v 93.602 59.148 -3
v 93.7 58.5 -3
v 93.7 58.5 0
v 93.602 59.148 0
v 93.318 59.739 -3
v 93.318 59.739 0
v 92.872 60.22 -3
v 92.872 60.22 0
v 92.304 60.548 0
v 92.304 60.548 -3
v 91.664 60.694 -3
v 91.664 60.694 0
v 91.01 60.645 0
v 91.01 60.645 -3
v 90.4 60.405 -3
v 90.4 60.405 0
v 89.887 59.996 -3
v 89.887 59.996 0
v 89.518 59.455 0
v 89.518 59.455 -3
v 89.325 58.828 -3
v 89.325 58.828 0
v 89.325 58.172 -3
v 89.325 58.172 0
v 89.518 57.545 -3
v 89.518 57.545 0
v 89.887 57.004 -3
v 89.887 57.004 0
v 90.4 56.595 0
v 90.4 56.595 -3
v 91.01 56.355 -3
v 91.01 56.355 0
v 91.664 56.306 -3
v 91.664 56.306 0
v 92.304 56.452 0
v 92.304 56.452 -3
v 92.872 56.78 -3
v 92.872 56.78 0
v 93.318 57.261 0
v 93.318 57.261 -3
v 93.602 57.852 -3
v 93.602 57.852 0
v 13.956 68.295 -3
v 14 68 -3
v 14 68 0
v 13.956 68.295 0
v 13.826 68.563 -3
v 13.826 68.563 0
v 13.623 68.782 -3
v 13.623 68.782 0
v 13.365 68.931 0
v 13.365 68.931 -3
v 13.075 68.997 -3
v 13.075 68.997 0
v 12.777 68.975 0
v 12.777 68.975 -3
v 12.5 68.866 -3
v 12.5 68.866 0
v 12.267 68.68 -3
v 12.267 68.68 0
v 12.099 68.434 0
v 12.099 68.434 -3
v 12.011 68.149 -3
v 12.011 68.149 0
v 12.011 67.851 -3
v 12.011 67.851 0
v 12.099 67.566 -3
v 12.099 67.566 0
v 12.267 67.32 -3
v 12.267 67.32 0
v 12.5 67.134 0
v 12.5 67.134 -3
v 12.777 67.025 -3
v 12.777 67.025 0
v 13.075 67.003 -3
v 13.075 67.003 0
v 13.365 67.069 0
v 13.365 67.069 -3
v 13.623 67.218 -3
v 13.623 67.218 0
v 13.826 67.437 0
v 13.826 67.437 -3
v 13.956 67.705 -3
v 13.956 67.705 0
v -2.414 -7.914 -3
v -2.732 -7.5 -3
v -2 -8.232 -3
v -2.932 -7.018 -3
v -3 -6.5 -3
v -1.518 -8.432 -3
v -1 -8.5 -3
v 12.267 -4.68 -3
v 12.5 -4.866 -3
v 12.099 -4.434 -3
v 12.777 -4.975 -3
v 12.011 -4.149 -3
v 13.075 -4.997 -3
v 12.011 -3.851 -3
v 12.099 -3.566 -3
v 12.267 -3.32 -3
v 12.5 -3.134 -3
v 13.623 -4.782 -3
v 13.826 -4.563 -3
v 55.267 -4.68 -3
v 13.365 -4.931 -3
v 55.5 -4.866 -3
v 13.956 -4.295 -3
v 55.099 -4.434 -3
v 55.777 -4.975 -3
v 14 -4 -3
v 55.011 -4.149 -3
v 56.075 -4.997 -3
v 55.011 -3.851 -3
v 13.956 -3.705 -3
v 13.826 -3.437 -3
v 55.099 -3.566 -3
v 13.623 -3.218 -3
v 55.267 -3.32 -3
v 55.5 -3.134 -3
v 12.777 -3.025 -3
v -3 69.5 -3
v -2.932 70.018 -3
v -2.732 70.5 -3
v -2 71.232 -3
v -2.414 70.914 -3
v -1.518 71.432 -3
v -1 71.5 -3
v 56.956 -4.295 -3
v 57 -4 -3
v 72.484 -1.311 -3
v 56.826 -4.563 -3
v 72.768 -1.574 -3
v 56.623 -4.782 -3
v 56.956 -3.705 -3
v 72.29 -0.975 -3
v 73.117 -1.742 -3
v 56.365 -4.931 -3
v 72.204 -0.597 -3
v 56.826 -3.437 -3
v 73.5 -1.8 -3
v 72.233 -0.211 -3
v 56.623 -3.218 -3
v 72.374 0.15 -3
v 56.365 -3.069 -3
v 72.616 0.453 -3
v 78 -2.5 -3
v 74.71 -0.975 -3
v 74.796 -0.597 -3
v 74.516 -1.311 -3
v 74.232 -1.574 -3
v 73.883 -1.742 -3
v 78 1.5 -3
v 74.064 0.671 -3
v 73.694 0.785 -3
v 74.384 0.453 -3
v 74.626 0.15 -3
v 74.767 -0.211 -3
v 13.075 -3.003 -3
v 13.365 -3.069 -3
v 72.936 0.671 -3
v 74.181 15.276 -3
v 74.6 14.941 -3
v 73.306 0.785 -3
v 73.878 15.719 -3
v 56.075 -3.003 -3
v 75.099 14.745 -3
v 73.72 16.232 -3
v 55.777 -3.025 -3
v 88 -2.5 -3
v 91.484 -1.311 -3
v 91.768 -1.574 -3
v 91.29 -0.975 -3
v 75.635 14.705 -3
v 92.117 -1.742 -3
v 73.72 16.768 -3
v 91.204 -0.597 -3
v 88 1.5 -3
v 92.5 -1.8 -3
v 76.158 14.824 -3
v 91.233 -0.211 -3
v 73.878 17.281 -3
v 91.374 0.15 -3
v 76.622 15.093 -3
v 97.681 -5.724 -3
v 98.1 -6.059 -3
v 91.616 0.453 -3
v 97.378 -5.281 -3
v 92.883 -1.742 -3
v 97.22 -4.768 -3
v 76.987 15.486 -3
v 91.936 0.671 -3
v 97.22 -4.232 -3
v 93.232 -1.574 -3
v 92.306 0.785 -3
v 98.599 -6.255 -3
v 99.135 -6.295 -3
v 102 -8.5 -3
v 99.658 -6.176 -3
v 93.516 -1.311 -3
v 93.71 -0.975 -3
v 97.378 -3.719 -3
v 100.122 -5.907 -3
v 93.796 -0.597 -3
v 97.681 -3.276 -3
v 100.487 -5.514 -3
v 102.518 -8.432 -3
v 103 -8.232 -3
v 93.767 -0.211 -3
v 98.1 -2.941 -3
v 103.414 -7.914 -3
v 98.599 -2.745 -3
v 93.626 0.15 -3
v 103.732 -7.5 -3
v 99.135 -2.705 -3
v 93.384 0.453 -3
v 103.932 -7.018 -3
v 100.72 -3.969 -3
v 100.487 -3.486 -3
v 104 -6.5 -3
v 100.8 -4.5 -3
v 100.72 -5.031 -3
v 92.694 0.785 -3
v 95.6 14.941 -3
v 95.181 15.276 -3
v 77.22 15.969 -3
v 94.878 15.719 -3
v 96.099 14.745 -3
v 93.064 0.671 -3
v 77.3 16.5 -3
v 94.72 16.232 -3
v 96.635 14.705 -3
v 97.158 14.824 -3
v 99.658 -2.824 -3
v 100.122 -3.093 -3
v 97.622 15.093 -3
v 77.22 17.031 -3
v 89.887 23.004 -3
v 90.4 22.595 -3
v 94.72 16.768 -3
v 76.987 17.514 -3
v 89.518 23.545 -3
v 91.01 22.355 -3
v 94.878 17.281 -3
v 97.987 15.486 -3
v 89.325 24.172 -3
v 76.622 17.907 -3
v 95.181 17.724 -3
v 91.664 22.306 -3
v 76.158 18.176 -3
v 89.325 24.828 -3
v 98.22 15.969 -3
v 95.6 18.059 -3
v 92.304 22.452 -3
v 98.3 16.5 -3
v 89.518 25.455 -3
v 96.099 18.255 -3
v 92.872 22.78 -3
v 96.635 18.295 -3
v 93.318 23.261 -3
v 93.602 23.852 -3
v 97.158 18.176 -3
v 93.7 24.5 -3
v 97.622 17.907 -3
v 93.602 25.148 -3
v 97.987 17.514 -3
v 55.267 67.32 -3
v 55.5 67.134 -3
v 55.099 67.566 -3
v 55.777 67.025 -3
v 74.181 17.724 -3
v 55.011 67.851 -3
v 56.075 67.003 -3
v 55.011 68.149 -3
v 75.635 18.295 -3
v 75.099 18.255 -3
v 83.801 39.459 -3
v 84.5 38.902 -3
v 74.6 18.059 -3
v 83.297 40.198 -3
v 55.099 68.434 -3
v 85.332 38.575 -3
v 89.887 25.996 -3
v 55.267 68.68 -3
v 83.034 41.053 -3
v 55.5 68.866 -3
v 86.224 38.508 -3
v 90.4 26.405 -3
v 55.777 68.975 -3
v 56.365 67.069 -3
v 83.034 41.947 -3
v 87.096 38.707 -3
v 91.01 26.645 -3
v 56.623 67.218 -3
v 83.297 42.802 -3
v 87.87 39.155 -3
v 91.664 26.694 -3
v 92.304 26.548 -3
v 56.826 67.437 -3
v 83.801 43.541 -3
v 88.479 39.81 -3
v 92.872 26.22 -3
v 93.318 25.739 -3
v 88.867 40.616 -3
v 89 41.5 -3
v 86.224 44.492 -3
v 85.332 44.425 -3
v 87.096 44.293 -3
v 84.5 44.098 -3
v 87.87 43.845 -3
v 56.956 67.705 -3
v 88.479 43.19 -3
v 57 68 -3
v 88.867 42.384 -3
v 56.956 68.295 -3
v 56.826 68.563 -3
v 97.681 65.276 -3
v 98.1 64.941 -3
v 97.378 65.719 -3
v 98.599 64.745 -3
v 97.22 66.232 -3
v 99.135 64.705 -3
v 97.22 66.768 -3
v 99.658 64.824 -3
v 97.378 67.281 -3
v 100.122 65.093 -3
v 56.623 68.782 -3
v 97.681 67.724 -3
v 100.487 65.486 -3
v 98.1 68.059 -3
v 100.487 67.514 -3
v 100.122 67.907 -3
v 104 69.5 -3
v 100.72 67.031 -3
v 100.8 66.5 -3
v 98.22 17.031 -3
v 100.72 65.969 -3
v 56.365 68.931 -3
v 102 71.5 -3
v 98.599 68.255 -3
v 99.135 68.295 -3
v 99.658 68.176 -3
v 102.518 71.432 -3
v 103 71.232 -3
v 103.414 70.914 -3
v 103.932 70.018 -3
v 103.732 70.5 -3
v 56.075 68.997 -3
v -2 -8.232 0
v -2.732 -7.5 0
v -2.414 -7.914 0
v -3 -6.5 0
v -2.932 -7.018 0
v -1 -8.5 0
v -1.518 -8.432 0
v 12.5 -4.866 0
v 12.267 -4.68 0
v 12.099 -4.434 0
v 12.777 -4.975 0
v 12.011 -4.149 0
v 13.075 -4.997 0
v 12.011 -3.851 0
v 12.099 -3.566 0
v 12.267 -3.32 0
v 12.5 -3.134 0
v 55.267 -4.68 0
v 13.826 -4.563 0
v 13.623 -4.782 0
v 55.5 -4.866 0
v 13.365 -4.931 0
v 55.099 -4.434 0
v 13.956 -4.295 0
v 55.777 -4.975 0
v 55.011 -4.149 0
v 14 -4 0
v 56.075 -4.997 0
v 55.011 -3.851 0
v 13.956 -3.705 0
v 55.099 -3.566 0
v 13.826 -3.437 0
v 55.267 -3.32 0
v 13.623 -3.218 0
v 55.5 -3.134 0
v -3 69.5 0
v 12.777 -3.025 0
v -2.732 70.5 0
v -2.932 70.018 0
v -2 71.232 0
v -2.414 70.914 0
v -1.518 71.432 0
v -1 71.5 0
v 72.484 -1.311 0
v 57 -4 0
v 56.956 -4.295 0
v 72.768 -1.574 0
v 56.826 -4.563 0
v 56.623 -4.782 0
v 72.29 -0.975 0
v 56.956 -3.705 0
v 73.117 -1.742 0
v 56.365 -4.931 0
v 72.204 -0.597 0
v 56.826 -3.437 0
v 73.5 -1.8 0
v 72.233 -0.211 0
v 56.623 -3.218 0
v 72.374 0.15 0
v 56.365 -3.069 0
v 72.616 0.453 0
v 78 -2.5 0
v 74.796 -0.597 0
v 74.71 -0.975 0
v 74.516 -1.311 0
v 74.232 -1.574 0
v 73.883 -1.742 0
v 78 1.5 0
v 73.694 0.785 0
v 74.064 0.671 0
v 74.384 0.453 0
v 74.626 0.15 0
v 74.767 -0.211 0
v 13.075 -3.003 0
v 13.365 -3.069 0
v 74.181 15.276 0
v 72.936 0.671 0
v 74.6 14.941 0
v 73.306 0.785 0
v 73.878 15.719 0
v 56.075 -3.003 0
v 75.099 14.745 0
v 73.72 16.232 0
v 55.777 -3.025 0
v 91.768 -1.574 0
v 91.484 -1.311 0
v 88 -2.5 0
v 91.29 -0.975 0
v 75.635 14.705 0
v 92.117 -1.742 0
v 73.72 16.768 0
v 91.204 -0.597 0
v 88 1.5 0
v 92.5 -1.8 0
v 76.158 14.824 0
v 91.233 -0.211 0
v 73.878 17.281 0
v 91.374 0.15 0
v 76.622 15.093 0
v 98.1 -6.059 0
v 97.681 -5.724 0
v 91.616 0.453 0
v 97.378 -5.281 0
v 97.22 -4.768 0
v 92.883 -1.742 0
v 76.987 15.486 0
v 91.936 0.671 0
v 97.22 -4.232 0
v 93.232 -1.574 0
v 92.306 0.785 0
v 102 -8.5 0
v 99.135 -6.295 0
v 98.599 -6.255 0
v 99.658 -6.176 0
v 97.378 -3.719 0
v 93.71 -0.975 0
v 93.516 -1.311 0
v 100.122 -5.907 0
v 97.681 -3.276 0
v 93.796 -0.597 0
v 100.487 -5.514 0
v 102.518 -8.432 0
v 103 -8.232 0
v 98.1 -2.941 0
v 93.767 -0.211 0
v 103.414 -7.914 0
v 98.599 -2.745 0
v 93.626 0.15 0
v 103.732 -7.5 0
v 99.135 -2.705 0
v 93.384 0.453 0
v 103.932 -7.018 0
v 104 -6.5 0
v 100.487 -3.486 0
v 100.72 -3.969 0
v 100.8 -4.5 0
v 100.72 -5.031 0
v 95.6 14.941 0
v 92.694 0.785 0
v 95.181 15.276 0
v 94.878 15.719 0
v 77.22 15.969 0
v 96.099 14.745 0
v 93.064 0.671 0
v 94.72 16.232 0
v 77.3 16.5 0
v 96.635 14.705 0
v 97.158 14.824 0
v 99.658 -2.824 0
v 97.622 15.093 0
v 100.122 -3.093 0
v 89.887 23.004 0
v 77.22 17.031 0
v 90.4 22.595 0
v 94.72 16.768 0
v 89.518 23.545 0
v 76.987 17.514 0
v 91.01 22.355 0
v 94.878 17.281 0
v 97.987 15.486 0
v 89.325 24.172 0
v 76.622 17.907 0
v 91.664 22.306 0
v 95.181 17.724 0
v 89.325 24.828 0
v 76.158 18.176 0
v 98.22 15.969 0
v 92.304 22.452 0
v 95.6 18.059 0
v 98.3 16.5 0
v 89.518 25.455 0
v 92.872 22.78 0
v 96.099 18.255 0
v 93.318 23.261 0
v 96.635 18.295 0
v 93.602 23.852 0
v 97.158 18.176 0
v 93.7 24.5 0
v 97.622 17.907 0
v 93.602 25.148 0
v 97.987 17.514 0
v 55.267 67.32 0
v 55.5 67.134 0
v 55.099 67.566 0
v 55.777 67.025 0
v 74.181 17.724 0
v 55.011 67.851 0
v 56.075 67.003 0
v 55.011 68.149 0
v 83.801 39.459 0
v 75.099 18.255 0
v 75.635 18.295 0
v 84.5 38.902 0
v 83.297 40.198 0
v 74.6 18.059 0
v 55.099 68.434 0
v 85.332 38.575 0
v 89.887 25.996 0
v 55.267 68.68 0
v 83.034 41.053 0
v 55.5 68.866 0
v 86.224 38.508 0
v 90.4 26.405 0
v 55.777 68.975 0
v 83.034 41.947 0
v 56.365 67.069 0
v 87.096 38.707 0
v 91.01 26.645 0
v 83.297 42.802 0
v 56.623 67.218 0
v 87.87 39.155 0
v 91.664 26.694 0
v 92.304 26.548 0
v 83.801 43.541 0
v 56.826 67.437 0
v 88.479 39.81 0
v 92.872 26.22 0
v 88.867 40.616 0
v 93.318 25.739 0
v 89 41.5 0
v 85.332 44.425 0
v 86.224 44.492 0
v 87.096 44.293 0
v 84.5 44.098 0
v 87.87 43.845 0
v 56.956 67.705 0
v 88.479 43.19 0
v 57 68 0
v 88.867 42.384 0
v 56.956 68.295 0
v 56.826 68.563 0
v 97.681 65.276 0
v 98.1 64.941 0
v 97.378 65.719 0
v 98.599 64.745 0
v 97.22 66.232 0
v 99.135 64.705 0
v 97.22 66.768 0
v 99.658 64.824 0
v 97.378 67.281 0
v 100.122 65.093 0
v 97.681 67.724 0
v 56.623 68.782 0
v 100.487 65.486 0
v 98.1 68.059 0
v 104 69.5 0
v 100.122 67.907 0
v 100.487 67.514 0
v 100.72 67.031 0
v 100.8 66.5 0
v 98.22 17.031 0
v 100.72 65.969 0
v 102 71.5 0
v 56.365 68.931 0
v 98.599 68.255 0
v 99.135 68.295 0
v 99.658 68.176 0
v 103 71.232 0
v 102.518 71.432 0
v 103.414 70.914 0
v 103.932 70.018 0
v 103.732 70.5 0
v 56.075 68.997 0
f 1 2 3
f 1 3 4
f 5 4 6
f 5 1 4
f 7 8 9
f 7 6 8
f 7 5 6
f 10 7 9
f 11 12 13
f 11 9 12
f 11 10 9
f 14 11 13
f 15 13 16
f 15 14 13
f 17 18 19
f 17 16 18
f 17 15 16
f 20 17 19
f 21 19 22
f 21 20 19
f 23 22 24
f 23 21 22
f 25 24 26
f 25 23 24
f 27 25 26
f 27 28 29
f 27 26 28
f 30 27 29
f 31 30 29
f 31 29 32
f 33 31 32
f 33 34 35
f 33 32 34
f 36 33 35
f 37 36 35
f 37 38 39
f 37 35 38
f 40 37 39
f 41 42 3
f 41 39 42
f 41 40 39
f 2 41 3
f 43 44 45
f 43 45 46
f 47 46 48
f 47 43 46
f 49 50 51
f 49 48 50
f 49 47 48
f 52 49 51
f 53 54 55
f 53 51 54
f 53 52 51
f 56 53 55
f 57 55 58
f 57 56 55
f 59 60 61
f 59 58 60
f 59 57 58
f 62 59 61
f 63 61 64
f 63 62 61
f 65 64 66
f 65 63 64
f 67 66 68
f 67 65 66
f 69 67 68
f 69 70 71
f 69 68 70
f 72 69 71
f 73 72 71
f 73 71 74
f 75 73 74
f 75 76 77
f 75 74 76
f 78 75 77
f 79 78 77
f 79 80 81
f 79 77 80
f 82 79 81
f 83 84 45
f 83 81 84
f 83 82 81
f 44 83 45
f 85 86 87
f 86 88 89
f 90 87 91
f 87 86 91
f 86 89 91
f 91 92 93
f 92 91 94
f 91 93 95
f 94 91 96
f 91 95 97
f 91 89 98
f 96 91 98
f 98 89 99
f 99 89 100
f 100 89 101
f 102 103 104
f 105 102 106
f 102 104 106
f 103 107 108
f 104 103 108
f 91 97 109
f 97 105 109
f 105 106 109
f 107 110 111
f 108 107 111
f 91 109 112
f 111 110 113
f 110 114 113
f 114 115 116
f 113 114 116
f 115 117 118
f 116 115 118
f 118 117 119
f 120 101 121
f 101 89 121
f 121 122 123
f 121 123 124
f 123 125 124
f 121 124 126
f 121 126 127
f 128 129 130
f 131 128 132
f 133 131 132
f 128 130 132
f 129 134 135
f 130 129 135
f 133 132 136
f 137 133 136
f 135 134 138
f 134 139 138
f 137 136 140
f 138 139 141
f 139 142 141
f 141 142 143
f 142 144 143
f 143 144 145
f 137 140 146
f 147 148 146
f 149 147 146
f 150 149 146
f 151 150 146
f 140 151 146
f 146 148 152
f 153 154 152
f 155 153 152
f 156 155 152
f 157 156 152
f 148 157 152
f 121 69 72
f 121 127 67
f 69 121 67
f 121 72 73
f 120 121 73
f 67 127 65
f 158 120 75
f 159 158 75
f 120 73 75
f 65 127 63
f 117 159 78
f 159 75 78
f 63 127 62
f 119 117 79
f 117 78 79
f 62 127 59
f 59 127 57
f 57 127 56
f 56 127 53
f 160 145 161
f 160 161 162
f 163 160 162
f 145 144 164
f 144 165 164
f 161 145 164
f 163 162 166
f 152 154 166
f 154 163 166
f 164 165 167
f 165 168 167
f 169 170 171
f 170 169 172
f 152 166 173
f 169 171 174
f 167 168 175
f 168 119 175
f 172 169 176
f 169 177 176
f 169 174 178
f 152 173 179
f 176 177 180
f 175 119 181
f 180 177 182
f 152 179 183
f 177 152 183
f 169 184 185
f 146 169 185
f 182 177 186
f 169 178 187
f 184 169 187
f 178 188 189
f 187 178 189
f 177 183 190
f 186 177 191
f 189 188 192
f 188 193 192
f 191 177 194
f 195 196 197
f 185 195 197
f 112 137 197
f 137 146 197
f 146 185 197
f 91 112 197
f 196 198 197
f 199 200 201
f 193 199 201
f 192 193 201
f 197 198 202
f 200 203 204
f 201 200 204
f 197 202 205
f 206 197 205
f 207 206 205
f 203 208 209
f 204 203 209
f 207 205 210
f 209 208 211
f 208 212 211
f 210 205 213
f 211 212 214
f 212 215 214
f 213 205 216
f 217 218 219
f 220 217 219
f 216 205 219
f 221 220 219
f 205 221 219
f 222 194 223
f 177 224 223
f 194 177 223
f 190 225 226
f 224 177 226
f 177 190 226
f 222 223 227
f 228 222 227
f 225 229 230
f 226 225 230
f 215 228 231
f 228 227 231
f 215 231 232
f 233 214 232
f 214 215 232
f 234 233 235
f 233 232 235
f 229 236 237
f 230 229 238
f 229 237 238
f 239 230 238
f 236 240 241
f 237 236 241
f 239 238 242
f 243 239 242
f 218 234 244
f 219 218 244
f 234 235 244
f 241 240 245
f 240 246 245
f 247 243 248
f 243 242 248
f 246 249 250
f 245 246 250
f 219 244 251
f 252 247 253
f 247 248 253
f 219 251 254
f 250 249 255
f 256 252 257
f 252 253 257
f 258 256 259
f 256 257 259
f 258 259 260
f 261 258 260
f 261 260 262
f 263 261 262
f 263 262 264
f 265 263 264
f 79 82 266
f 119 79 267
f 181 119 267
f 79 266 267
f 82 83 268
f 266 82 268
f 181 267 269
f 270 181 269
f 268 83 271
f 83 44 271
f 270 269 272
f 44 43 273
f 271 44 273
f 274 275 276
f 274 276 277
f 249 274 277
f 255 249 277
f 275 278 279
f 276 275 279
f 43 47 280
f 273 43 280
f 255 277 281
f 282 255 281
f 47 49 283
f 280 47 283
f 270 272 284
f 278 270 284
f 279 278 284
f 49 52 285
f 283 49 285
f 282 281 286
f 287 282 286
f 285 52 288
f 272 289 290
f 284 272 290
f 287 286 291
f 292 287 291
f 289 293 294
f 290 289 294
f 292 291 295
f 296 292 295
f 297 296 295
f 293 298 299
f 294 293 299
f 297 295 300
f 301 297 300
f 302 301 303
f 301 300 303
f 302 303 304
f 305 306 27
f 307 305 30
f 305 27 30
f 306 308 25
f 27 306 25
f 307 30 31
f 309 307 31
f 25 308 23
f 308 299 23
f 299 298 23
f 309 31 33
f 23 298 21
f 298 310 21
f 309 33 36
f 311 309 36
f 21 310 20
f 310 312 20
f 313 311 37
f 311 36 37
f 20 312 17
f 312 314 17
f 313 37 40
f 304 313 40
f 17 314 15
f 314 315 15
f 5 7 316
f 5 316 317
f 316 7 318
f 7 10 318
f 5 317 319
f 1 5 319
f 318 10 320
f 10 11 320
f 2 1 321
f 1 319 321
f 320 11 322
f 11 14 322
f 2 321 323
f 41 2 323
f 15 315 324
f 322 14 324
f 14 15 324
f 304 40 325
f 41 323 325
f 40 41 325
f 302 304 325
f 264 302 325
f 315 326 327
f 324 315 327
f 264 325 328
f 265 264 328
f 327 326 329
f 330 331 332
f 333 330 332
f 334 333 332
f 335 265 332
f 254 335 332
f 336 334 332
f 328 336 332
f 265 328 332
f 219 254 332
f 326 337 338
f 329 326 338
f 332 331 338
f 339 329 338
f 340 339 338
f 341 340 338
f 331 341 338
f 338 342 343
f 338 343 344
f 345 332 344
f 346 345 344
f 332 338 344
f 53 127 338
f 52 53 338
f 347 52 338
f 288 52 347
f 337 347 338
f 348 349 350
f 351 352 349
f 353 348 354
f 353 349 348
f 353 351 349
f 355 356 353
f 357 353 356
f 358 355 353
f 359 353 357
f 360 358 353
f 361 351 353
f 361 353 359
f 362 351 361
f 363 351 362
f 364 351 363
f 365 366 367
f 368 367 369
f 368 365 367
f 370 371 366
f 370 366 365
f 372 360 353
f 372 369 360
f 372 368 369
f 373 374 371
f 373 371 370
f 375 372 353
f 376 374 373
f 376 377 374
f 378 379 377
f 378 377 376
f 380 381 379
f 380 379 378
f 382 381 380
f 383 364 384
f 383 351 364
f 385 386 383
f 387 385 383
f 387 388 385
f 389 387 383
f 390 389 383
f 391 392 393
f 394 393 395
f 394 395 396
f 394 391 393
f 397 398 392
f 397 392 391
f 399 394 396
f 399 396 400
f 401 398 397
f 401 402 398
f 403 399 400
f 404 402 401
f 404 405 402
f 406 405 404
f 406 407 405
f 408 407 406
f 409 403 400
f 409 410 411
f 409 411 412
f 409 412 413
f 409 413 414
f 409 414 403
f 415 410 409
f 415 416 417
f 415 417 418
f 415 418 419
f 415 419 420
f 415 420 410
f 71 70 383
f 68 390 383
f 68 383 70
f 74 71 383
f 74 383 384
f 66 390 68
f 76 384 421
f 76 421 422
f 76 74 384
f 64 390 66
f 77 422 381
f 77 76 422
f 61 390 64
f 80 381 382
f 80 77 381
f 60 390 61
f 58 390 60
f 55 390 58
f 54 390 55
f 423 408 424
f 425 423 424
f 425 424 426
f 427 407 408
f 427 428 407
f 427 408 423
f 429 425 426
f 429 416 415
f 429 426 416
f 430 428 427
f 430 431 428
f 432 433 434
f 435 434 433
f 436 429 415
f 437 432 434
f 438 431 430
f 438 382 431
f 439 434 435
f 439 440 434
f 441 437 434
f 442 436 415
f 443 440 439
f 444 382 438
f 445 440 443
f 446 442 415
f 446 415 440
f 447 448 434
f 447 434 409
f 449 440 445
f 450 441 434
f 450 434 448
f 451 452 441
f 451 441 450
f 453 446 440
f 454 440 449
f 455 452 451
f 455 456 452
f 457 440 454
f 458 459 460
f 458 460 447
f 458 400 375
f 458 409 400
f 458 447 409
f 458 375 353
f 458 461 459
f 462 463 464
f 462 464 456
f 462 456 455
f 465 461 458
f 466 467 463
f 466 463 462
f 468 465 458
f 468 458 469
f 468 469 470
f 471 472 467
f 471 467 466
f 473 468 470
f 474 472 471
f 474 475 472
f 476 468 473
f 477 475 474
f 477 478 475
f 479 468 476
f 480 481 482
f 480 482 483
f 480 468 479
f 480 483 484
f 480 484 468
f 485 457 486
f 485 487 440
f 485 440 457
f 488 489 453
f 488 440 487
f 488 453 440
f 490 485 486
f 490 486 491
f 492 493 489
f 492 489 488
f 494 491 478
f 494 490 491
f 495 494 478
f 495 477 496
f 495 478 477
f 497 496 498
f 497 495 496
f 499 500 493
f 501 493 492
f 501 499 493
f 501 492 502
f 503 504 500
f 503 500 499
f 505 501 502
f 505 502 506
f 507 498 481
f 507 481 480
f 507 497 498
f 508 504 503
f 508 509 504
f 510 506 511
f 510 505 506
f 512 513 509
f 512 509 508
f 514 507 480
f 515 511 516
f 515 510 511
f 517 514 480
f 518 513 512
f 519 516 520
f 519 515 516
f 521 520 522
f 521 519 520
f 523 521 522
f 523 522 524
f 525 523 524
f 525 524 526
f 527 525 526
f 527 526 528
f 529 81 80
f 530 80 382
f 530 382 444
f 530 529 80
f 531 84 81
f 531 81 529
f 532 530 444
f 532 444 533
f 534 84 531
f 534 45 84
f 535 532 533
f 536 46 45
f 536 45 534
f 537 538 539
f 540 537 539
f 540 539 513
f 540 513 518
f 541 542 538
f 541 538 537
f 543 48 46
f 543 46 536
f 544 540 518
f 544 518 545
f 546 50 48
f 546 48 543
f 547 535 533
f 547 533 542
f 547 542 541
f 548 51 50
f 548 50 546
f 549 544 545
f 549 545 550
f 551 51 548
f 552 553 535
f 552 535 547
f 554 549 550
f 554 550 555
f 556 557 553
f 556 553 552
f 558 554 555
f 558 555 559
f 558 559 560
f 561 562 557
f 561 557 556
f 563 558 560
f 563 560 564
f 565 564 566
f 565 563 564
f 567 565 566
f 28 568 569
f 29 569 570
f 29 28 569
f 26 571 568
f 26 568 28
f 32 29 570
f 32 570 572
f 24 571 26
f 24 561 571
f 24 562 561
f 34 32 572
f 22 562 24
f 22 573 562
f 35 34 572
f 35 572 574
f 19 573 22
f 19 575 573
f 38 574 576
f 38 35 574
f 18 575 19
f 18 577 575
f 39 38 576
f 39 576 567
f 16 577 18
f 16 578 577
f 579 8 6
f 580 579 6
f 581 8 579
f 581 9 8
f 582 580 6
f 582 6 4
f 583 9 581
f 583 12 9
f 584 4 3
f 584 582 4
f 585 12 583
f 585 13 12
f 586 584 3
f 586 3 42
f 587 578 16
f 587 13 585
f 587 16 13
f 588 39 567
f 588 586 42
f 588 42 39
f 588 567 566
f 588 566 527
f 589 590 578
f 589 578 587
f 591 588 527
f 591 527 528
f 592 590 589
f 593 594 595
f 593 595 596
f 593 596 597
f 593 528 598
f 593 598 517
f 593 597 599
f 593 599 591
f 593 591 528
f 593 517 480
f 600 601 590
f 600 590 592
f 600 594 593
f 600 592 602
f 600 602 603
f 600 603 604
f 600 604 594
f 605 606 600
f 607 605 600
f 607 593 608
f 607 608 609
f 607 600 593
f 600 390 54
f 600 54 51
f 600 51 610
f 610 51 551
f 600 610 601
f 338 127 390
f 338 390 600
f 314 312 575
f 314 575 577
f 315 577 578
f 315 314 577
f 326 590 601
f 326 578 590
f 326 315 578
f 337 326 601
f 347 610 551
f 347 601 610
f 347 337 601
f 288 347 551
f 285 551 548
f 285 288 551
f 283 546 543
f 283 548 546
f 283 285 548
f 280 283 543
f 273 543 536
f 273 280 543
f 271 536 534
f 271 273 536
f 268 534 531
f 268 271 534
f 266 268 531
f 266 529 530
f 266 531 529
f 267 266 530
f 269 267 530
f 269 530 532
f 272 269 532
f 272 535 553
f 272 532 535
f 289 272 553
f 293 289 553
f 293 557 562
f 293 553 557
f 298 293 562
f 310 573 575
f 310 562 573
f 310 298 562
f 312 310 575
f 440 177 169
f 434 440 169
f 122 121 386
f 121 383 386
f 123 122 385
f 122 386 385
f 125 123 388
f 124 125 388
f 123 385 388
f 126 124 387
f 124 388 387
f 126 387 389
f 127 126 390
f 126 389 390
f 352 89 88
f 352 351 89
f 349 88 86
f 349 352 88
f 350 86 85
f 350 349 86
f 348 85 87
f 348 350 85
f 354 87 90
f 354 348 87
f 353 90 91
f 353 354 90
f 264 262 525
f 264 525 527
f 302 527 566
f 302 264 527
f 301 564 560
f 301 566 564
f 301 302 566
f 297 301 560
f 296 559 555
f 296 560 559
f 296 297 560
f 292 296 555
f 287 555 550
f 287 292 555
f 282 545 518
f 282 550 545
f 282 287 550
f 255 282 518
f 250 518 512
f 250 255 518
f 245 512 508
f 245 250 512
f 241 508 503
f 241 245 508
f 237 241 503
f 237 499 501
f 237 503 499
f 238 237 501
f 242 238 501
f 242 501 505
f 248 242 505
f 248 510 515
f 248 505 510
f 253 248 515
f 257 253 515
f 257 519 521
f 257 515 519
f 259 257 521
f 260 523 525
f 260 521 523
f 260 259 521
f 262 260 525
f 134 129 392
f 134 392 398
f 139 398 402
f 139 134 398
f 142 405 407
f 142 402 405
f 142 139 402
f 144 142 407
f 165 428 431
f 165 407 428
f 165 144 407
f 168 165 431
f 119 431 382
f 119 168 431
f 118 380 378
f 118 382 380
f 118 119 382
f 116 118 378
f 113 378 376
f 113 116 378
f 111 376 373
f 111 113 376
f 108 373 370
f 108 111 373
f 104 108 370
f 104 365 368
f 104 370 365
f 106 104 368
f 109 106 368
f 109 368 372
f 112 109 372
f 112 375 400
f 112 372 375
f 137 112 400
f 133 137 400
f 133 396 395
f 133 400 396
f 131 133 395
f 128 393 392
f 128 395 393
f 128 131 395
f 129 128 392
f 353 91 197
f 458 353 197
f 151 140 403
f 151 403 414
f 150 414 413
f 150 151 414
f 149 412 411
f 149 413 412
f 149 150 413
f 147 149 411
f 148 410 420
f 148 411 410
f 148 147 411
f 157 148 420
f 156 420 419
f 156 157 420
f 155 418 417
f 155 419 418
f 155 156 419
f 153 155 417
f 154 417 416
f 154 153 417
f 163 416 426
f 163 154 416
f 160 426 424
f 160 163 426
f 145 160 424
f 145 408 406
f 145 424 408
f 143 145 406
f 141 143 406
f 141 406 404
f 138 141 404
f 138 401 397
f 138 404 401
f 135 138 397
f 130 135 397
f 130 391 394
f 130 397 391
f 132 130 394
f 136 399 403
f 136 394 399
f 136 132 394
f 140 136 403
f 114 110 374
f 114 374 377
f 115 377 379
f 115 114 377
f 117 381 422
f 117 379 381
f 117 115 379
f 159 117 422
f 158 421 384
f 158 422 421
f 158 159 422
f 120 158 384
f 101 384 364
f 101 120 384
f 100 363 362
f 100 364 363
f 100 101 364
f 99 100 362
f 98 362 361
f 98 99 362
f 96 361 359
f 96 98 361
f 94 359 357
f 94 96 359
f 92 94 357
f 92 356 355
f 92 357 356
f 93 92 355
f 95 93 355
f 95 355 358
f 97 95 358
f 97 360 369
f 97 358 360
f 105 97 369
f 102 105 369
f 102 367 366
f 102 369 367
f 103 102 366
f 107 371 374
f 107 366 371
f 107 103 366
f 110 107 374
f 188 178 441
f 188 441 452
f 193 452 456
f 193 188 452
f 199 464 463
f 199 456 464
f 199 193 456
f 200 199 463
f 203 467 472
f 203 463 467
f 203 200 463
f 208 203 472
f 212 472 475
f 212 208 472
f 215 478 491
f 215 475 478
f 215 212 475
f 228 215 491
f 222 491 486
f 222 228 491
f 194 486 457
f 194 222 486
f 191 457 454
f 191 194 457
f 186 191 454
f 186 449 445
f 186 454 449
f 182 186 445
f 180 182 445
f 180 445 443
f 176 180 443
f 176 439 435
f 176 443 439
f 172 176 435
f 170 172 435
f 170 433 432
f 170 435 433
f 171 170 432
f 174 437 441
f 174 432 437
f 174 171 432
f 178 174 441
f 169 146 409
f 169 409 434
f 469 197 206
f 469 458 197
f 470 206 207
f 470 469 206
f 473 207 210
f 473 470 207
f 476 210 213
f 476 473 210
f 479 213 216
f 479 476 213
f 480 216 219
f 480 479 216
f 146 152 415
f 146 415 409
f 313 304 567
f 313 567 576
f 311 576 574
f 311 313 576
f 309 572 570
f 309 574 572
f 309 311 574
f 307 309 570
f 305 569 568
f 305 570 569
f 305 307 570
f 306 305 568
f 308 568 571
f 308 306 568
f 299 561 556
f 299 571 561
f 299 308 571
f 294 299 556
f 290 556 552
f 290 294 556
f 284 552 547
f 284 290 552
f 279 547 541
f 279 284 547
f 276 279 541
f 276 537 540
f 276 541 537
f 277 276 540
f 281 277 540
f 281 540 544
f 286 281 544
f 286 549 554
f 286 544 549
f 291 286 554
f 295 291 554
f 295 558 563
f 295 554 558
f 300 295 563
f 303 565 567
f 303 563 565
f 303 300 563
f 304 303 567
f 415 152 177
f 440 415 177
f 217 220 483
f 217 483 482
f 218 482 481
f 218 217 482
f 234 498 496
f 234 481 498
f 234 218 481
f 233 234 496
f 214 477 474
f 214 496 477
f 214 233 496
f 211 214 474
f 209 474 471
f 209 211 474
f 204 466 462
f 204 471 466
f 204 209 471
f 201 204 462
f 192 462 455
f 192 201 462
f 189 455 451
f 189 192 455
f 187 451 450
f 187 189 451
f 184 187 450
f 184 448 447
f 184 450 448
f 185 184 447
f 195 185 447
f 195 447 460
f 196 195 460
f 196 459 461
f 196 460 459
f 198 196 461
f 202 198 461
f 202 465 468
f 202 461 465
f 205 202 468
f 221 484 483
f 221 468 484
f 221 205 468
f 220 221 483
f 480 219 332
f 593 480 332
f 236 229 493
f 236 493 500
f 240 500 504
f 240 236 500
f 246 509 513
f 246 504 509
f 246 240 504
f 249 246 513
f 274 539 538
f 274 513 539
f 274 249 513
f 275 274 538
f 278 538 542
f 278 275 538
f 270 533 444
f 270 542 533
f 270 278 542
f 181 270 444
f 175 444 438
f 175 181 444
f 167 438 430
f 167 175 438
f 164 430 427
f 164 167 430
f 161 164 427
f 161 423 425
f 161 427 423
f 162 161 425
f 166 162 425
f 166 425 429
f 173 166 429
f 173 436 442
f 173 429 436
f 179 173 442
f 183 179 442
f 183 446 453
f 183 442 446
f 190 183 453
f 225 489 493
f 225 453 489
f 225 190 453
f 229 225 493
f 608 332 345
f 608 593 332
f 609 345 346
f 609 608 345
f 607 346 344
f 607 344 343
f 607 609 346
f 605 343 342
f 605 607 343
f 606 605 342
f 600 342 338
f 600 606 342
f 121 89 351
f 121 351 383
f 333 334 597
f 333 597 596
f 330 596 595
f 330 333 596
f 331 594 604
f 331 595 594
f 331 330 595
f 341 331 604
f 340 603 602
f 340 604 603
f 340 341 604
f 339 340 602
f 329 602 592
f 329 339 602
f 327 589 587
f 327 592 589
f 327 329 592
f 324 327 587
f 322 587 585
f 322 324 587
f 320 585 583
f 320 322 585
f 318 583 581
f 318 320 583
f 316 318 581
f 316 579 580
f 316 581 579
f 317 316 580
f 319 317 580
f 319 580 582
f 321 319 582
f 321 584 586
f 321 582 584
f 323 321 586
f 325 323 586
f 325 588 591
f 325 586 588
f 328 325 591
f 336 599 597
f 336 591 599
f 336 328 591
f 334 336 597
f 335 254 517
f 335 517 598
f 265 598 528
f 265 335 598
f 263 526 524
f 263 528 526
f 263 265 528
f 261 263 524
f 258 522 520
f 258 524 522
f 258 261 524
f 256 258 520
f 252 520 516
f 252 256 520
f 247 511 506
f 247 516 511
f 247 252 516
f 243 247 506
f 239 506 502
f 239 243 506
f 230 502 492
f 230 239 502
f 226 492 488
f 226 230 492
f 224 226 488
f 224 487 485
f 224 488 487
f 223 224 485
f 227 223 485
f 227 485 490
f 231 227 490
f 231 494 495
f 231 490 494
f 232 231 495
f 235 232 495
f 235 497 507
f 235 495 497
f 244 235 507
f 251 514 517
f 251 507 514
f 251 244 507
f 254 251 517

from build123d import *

# Parameters (mm, degrees)
CYLINDER001_R     = 1.8
CYLINDER001_DEPTH = 40
ARRAY002_X_COUNT  = 2
ARRAY002_X_PITCH  = 21
CYLINDER002_R     = 1
CYLINDER002_DEPTH = 100
ARRAY003_X_COUNT  = 2
ARRAY003_X_PITCH  = 43
ARRAY003_Y_COUNT  = 2
ARRAY003_Y_PITCH  = 72
CYLINDER003_R     = 1.8
CYLINDER003_DEPTH = 40
ARRAY004_Y_COUNT  = 2
ARRAY004_Y_PITCH  = 71
BOX005_W          = 4
BOX005_H          = 10
BOX005_DEPTH      = 40
CYLINDER004_R     = 2.2
CYLINDER004_DEPTH = 40
ARRAY005_Y_COUNT  = 2
ARRAY005_Y_PITCH  = 34
CYLINDER005_R     = 3
CYLINDER005_DEPTH = 40
CYLINDER_R        = 1.3
CYLINDER_DEPTH    = 40
ARRAY001_X_COUNT  = 2
ARRAY001_X_PITCH  = 19
BOX004_W          = 107
BOX004_H          = 80
BOX004_DEPTH      = 3
FILLET001_R       = 2


with BuildPart() as array002:
    # Cylinder001 → Cylinder001 (new body)
    with BuildSketch(Plane(origin=(75.5, 16.5, -15), x_dir=(1, 0, 0), z_dir=(0, 0, 1))):
        Circle(CYLINDER001_R)
    extrude(amount=CYLINDER001_DEPTH)

    # Array002 X: Array002 ×2


with BuildPart() as array002_1:
    add(array002.part)
    with Locations(*[(i * ARRAY002_X_PITCH, 0, 0) for i in range(1, ARRAY002_X_COUNT)]):
        add(array002.part)


with BuildPart() as array_battery_holder_holes:
    # Cylinder002 → Cylinder002 (new body)
    with BuildSketch(Plane(origin=(13, -4, -15), x_dir=(1, 0, 0), z_dir=(0, 0, 1))):
        Circle(CYLINDER002_R)
    extrude(amount=CYLINDER002_DEPTH)

    # Array003 X: Array battery holder holes ×2


with BuildPart() as array_battery_holder_holes_1:
    add(array_battery_holder_holes.part)
    with Locations(*[(i * ARRAY003_X_PITCH, 0, 0) for i in range(1, ARRAY003_X_COUNT)]):
        add(array_battery_holder_holes.part)

    # Array003 Y: Array battery holder holes ×2


with BuildPart() as array_battery_holder_holes_2:
    add(array_battery_holder_holes_1.part)
    with Locations(*[(0, i * ARRAY003_Y_PITCH, 0) for i in range(1, ARRAY003_Y_COUNT)]):
        add(array_battery_holder_holes_1.part)


with BuildPart() as array_corners:
    # Cylinder003 → Cylinder003 (new body)
    with BuildSketch(Plane(origin=(99, -4.5, -15), x_dir=(1, 0, 0), z_dir=(0, 0, 1))):
        Circle(CYLINDER003_R)
    extrude(amount=CYLINDER003_DEPTH)

    # Array004 Y: Array corners ×2


with BuildPart() as array_corners_1:
    add(array_corners.part)
    with Locations(*[(0, i * ARRAY004_Y_PITCH, 0) for i in range(1, ARRAY004_Y_COUNT)]):
        add(array_corners.part)


with BuildPart() as cube_switch_cut:
    # Box005 → Box005 (new body)
    with BuildSketch(Plane(origin=(78, 1.5, -10), x_dir=(0, -1, 0), z_dir=(0, 0, 1))):
        with Locations((2, 5)):
            Rectangle(BOX005_W, BOX005_H)
    extrude(amount=BOX005_DEPTH)


with BuildPart() as array_usb:
    # Cylinder004 → Cylinder004 (new body)
    with BuildSketch(Plane(origin=(91.5, 24.5, -15), x_dir=(1, 0, 0), z_dir=(0, 0, 1))):
        Circle(CYLINDER004_R)
    extrude(amount=CYLINDER004_DEPTH)

    # Array005 Y: Array usb ×2


with BuildPart() as array_usb_1:
    add(array_usb.part)
    with Locations(*[(0, i * ARRAY005_Y_PITCH, 0) for i in range(1, ARRAY005_Y_COUNT)]):
        add(array_usb.part)


with BuildPart() as cylinder_usb_center:
    # Cylinder005 → Cylinder005 (new body)
    with BuildSketch(Plane(origin=(86, 41.5, -15), x_dir=(1, 0, 0), z_dir=(0, 0, 1))):
        Circle(CYLINDER005_R)
    extrude(amount=CYLINDER005_DEPTH)


with BuildPart() as fusion001:
    # Cylinder → Cylinder (new body)
    with BuildSketch(Plane(origin=(73.5, -0.5, -15), x_dir=(0, -1, 0), z_dir=(0, 0, 1))):
        Circle(CYLINDER_R)
    extrude(amount=CYLINDER_DEPTH)

    # Array001 X: Fusion001 ×2


with BuildPart() as fusion001_1:
    add(fusion001.part)
    with Locations(*[(i * ARRAY001_X_PITCH, 0, 0) for i in range(1, ARRAY001_X_COUNT)]):
        add(fusion001.part)

    # Fusion001: union Array002, Array battery holder holes, Array corners, Cube switch cut, Array usb, Cylinder usb center
    add(array002_1.part)
    add(array_battery_holder_holes_2.part)
    add(array_corners_1.part)
    add(cube_switch_cut.part)
    add(array_usb_1.part)
    add(cylinder_usb_center.part)


with BuildPart() as top_lid_clone:
    # Box004 → Box004 (new body)
    with BuildSketch(Plane(origin=(-3, -8.5, -3), x_dir=(1, 0, 0), z_dir=(0, 0, 1))):
        with Locations((53.5, 40)):
            Rectangle(BOX004_W, BOX004_H)
    extrude(amount=BOX004_DEPTH)

    # Fillet001
    fillet001_edges = [top_lid_clone.edges().sort_by_distance(p)[0] for p in [
        (-3, -8.5, -1.5),
        (-3, 71.5, -1.5),
        (104, -8.5, -1.5),
        (104, 71.5, -1.5),
    ]]
    fillet(fillet001_edges, radius=FILLET001_R)

    # Cut001: cut Fusion001
    add(fusion001_1.part, mode=Mode.SUBTRACT)


solid = top_lid_clone.part
